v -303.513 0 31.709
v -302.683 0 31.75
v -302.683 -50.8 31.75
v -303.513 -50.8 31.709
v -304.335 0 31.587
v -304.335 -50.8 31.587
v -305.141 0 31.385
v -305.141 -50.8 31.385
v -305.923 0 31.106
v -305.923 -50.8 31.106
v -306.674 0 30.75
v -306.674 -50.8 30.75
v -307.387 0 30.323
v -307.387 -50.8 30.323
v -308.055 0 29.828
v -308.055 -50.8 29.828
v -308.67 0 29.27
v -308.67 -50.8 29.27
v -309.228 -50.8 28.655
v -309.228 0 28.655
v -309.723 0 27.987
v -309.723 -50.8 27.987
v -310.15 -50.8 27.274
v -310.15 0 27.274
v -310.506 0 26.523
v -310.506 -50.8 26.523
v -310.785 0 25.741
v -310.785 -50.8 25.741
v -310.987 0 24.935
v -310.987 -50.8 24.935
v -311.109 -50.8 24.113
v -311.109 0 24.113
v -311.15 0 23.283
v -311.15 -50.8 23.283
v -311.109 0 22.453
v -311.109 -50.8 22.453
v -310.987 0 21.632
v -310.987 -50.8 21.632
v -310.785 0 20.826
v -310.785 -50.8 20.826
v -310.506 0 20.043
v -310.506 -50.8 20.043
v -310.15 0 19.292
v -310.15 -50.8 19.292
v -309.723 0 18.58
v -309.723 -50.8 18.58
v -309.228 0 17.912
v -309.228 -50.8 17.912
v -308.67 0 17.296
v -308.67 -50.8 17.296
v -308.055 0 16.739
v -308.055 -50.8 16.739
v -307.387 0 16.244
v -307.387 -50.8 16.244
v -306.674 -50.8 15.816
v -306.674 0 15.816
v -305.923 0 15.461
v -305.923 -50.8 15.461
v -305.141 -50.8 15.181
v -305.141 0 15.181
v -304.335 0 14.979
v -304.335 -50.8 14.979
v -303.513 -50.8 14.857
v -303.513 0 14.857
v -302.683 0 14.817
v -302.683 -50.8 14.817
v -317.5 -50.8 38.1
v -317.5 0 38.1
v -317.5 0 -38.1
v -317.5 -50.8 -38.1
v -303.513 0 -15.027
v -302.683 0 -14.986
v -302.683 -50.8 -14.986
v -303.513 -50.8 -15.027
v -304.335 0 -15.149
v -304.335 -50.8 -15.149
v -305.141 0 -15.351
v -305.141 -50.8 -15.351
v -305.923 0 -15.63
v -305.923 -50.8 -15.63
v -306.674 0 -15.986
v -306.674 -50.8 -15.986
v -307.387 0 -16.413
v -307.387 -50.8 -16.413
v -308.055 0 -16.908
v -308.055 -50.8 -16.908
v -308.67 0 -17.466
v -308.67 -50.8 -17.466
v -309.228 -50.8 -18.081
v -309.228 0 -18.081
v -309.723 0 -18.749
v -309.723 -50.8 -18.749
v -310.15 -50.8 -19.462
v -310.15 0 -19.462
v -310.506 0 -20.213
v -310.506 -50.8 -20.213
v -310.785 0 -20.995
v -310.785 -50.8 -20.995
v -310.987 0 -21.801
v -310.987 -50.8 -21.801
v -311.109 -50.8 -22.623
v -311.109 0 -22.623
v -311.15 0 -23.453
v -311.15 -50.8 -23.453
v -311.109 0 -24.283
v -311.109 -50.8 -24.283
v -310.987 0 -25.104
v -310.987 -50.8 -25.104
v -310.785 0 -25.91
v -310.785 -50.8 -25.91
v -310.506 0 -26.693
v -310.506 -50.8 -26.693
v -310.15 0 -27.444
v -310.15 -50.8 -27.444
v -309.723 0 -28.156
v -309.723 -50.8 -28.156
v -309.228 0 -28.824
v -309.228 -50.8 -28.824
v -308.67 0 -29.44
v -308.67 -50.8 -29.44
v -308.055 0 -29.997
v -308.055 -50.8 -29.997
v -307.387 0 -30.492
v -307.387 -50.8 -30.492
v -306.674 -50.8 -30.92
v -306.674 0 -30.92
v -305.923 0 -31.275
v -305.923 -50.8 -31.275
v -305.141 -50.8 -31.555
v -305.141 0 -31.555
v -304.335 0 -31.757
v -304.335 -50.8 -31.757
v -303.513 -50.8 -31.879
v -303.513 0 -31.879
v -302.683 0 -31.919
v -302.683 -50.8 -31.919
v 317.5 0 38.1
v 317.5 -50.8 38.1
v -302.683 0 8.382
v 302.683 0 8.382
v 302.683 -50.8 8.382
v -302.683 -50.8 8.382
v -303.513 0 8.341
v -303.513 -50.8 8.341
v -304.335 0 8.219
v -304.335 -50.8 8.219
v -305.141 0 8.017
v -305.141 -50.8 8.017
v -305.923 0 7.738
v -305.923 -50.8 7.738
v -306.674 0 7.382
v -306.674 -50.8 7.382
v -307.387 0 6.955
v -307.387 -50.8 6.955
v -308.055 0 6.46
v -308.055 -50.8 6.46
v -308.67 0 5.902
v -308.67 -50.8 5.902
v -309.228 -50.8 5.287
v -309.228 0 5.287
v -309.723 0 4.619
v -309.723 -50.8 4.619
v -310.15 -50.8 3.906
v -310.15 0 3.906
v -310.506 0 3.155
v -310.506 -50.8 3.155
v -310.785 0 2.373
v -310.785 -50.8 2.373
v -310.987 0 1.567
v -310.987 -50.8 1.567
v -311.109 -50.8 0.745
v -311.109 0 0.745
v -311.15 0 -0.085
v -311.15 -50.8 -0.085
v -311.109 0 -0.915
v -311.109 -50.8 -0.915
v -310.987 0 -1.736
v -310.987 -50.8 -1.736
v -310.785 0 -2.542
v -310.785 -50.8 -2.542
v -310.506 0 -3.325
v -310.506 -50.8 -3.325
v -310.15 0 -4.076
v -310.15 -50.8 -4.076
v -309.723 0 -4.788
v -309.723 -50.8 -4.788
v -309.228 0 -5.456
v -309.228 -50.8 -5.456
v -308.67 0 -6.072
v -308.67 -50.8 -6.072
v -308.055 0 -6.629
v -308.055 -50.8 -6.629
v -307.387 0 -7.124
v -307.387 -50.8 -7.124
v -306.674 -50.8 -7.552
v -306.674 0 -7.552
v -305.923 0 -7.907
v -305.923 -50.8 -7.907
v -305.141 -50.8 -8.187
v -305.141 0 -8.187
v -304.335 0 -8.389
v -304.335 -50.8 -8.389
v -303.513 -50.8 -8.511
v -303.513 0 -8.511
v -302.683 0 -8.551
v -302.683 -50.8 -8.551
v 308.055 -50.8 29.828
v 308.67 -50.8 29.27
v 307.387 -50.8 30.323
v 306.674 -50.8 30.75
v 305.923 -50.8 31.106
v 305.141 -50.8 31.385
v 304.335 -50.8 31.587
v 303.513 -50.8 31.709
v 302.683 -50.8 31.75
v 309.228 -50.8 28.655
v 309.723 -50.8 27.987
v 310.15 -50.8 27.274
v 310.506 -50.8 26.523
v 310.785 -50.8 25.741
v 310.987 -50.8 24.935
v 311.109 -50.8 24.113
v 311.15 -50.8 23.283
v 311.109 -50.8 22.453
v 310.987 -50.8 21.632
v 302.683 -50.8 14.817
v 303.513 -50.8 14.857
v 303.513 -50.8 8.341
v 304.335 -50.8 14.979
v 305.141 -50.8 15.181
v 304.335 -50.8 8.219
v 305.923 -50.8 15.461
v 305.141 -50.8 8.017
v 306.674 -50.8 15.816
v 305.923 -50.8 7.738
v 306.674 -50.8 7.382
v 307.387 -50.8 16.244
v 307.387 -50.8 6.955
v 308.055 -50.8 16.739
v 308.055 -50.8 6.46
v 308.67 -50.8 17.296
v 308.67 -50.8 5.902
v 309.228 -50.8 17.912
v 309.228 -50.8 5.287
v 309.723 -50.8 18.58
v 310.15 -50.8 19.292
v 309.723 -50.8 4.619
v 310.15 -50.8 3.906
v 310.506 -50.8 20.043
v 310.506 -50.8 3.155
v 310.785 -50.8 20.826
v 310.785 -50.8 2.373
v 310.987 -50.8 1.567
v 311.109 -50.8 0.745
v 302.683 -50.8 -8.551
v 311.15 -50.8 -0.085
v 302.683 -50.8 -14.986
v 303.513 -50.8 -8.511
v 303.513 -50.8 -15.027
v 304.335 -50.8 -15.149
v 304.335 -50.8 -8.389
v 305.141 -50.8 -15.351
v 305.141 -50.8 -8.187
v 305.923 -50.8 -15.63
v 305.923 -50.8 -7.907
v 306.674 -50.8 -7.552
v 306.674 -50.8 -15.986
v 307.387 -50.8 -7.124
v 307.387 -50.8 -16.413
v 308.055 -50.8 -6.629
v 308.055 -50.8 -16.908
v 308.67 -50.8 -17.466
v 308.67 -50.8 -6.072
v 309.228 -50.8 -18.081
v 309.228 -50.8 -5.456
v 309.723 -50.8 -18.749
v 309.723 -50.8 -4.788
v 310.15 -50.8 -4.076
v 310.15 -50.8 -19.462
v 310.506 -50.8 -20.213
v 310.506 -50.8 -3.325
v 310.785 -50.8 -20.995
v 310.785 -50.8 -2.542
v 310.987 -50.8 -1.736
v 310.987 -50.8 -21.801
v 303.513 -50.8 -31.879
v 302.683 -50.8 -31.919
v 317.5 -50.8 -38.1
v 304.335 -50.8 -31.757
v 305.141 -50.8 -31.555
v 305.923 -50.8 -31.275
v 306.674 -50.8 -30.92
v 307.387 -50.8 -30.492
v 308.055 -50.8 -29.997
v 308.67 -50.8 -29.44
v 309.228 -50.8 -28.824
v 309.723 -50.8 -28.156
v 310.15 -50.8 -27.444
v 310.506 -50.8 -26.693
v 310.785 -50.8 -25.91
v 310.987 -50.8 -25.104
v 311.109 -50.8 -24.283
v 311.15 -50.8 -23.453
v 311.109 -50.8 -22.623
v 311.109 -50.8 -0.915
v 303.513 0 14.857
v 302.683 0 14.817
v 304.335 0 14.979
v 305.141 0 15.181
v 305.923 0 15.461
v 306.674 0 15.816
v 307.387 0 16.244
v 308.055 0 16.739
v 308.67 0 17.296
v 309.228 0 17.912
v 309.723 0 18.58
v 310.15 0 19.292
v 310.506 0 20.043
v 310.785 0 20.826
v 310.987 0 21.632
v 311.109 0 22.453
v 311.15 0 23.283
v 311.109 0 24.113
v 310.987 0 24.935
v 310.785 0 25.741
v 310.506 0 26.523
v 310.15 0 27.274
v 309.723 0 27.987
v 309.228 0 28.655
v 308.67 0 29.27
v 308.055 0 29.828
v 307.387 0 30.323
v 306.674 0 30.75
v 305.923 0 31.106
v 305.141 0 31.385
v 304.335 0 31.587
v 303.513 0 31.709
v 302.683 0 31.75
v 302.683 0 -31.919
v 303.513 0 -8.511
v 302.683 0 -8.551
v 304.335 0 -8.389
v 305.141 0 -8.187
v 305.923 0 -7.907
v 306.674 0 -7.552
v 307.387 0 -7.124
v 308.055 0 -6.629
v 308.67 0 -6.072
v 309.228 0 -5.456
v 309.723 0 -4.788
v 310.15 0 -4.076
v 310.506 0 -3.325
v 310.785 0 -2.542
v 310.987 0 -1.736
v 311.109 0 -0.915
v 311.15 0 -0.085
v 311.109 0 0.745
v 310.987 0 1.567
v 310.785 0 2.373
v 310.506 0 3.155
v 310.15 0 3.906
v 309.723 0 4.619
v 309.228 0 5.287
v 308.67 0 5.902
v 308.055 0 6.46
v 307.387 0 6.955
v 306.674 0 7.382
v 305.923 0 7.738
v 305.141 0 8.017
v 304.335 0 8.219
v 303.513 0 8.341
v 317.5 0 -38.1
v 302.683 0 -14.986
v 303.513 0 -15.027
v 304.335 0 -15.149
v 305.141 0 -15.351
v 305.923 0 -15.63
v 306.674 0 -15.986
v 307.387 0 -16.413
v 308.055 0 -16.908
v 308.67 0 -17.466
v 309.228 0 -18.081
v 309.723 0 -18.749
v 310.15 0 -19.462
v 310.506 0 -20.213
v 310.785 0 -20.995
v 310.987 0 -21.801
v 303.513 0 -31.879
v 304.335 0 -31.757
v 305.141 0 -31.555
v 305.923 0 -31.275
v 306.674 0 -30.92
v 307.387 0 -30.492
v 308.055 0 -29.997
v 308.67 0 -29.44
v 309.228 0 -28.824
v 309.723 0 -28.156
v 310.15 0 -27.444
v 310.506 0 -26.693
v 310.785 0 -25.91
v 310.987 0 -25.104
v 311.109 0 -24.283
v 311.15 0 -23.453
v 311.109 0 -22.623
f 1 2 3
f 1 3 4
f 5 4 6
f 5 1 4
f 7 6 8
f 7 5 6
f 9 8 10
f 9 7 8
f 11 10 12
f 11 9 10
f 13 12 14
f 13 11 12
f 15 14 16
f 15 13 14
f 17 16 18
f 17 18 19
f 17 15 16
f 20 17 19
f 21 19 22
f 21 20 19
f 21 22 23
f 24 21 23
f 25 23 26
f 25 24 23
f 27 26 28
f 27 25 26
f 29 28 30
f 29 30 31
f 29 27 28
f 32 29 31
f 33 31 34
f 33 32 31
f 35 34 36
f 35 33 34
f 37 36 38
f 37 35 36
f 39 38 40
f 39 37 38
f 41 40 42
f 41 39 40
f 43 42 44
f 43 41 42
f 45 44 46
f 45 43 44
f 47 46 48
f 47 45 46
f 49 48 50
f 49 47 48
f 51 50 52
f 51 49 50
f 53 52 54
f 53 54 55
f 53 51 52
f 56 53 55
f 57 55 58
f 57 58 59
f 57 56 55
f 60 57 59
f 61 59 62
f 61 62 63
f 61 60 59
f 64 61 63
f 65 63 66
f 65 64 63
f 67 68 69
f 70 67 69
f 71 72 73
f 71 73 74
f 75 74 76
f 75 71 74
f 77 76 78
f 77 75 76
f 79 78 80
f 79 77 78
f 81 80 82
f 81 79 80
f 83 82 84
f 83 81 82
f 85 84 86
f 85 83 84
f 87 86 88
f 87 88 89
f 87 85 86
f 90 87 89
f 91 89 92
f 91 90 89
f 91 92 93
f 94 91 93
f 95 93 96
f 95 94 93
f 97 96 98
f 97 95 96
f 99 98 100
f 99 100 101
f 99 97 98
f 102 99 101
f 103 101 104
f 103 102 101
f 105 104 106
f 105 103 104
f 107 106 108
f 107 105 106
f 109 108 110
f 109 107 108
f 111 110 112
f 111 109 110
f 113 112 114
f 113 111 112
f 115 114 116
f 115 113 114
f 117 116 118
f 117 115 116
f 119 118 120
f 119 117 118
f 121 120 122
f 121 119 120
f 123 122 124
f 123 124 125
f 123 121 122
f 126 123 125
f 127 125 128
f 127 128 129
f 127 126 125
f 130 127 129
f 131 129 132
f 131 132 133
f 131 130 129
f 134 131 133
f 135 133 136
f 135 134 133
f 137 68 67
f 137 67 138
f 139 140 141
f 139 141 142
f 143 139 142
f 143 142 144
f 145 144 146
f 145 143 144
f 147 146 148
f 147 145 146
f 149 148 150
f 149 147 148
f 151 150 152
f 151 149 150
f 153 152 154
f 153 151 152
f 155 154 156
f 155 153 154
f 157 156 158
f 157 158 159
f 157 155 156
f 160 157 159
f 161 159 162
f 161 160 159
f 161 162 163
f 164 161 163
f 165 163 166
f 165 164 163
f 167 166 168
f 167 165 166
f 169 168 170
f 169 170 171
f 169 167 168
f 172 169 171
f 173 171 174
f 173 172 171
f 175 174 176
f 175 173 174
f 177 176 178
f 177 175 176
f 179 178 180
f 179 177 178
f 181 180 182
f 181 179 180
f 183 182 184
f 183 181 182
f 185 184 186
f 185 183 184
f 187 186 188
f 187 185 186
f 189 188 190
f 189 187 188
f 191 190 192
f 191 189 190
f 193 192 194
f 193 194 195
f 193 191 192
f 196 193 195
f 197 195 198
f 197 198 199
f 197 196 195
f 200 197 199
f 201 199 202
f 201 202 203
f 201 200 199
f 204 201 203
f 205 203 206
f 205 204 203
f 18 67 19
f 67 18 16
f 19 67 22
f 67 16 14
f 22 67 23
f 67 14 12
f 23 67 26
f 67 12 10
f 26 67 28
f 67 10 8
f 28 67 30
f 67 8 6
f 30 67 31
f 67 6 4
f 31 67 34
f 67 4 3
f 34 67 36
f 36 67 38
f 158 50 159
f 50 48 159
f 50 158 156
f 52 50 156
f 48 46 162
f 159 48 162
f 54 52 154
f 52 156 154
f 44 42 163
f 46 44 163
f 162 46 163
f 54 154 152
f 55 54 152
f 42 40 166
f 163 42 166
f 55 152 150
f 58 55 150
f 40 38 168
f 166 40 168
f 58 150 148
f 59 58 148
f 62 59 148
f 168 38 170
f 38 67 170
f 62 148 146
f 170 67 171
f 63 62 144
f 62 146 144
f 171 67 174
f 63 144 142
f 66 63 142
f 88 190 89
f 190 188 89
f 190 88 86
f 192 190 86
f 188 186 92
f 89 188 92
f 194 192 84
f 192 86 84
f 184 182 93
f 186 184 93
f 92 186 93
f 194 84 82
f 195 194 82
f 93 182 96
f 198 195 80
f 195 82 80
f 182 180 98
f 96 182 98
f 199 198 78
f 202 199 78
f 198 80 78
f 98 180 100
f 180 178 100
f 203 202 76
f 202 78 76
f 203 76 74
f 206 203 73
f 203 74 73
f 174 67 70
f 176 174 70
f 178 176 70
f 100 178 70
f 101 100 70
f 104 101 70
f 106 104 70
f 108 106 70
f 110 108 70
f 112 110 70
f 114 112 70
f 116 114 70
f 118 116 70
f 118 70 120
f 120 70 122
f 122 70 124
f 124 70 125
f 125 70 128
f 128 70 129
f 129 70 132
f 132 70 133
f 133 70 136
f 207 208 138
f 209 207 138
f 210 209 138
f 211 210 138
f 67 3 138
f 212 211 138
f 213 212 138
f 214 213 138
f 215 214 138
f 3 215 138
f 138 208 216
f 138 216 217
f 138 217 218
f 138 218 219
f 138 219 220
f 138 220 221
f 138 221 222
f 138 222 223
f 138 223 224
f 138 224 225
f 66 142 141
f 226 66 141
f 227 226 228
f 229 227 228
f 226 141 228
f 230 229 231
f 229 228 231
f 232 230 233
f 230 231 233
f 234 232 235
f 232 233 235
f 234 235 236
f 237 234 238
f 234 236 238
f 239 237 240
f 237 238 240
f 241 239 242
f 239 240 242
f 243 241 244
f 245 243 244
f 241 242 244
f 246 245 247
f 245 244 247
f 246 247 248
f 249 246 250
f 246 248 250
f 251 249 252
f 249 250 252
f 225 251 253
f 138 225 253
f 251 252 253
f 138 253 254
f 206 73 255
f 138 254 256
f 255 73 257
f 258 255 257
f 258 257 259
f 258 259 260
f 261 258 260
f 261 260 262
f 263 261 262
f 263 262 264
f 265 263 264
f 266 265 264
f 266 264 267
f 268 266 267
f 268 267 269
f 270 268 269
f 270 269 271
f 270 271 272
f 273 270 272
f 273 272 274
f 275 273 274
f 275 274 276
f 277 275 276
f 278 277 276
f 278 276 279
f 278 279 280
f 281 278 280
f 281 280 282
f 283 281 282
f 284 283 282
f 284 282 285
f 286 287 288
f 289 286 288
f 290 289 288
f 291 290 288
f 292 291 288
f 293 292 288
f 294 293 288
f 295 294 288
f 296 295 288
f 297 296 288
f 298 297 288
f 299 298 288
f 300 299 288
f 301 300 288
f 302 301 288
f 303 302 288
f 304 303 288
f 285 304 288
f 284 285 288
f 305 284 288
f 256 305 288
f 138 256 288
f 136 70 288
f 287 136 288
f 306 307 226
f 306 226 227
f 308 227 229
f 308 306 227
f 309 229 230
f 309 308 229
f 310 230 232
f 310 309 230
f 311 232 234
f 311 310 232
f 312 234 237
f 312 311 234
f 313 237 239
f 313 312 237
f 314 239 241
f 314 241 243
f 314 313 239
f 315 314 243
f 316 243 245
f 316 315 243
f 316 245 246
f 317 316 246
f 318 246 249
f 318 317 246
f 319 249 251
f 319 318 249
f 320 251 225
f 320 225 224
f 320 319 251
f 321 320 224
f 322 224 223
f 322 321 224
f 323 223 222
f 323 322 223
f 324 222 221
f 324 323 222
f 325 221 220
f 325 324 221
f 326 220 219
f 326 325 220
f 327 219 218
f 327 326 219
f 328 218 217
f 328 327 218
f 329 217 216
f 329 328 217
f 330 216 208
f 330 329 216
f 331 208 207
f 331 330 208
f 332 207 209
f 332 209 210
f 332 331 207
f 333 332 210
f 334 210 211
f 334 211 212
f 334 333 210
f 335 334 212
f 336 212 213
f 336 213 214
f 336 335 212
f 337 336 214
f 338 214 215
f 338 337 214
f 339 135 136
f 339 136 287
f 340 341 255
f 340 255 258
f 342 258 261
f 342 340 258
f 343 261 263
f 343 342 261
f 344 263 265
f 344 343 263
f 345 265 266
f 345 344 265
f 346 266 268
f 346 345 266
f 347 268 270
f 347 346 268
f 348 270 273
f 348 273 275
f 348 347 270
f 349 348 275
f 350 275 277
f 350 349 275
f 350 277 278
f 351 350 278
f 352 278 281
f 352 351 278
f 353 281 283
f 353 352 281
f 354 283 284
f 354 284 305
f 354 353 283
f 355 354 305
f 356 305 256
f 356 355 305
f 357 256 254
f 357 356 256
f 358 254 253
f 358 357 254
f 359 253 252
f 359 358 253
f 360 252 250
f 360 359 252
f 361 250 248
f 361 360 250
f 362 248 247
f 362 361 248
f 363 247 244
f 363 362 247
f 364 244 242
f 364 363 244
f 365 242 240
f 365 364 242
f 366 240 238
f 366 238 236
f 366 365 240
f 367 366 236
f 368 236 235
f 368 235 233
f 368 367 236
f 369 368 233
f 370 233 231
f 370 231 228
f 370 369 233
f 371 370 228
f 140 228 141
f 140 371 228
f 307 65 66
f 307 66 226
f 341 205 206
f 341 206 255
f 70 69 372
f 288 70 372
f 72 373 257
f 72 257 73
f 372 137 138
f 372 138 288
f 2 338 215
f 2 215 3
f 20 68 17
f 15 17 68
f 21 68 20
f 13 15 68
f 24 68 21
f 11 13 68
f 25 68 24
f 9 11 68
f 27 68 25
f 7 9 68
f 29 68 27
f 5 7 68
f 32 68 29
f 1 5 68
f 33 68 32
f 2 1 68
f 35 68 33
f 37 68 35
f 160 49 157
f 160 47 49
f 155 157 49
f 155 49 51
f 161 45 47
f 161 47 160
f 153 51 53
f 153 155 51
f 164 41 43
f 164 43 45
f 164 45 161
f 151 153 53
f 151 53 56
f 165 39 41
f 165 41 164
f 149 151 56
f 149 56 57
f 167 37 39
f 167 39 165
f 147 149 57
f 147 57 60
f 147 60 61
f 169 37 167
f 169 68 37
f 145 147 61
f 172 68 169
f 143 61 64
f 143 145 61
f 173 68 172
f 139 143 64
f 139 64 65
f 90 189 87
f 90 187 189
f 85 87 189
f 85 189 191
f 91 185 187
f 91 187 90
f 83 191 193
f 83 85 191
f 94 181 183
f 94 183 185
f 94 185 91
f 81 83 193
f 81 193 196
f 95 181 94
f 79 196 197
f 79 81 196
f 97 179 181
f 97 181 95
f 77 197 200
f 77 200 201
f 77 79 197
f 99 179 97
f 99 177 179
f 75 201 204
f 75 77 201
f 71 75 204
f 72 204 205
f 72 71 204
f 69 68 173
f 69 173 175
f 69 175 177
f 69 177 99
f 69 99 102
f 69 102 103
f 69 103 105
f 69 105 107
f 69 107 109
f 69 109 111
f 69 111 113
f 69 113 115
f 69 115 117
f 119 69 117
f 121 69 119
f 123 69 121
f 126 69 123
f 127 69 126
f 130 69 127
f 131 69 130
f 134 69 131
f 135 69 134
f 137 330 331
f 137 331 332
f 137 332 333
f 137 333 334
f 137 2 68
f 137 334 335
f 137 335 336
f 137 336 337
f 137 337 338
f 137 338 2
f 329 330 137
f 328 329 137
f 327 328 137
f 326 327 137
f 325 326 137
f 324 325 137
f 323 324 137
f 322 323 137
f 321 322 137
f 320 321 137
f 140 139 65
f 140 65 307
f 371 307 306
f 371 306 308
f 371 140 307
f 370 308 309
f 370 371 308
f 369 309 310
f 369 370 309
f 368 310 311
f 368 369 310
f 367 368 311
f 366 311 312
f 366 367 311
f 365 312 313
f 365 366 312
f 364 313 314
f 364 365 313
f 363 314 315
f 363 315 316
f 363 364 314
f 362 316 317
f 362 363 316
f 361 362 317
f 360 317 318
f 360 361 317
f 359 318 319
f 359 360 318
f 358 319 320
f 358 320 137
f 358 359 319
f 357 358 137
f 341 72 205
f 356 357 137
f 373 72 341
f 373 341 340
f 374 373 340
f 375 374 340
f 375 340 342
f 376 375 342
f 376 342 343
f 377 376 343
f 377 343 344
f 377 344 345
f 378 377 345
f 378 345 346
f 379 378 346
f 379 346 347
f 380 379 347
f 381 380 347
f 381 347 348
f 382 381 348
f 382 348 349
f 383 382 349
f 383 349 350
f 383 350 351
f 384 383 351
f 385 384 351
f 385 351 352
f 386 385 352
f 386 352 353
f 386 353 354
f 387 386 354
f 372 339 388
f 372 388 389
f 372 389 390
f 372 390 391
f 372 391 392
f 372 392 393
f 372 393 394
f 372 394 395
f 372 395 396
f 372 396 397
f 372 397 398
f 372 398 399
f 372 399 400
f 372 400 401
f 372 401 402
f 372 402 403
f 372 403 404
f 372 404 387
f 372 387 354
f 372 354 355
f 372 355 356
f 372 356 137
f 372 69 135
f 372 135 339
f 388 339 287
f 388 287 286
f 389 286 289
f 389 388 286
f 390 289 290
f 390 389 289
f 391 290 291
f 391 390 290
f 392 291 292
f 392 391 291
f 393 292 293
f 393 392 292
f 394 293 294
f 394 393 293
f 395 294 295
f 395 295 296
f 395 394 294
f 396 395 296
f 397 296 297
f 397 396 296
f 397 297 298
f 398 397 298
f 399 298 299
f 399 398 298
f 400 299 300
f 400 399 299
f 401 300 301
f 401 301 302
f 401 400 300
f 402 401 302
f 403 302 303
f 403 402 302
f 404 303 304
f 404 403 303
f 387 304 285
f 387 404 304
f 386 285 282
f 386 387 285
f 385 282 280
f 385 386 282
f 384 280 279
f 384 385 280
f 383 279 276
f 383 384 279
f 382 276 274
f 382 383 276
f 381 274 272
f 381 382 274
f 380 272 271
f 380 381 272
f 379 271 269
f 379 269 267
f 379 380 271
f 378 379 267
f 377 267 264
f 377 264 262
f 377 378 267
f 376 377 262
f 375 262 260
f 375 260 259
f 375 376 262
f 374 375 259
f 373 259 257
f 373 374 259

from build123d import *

# Parameters (mm, degrees)
SKETCH1_W           = 635
SKETCH1_H           = 76.2
BOSS_EXTRUDE1_DEPTH = 50.8


with BuildPart() as part:
    # Sketch1 → Boss-Extrude1 (new body)
    with BuildSketch(Plane(origin=(0, 0, 0), x_dir=(1, 0, 0), z_dir=(0, 1, 0))):
        Rectangle(SKETCH1_W, SKETCH1_H)
        with BuildLine():
            Line((302.683333333, -8.382), (-302.683333333, -8.382))
            ThreePointArc((-302.683333333, -8.382), (-311.15, 0.084666667), (-302.683333333, 8.551333333))
            Line((-302.683333333, 8.551333333), (302.683333333, 8.551333333))
            ThreePointArc((302.683333333, 8.551333333), (311.15, 0.084666667), (302.683333333, -8.382))
        make_face(mode=Mode.SUBTRACT)
        with BuildLine():
            Line((302.683333333, -31.75), (-302.683333333, -31.75))
            ThreePointArc((-302.683333333, -31.75), (-311.15, -23.283333333), (-302.683333333, -14.816666667))
            Line((-302.683333333, -14.816666667), (302.683333333, -14.816666667))
            ThreePointArc((302.683333333, -14.816666667), (311.15, -23.283333333), (302.683333333, -31.75))
        make_face(mode=Mode.SUBTRACT)
        with BuildLine():
            Line((302.683333333, 14.986), (-302.683333333, 14.986))
            ThreePointArc((-302.683333333, 14.986), (-311.15, 23.452666667), (-302.683333333, 31.919333333))
            Line((-302.683333333, 31.919333333), (302.683333333, 31.919333333))
            ThreePointArc((302.683333333, 31.919333333), (311.15, 23.452666667), (302.683333333, 14.986))
        make_face(mode=Mode.SUBTRACT)
    extrude(amount=-BOSS_EXTRUDE1_DEPTH)


solid = part.part
